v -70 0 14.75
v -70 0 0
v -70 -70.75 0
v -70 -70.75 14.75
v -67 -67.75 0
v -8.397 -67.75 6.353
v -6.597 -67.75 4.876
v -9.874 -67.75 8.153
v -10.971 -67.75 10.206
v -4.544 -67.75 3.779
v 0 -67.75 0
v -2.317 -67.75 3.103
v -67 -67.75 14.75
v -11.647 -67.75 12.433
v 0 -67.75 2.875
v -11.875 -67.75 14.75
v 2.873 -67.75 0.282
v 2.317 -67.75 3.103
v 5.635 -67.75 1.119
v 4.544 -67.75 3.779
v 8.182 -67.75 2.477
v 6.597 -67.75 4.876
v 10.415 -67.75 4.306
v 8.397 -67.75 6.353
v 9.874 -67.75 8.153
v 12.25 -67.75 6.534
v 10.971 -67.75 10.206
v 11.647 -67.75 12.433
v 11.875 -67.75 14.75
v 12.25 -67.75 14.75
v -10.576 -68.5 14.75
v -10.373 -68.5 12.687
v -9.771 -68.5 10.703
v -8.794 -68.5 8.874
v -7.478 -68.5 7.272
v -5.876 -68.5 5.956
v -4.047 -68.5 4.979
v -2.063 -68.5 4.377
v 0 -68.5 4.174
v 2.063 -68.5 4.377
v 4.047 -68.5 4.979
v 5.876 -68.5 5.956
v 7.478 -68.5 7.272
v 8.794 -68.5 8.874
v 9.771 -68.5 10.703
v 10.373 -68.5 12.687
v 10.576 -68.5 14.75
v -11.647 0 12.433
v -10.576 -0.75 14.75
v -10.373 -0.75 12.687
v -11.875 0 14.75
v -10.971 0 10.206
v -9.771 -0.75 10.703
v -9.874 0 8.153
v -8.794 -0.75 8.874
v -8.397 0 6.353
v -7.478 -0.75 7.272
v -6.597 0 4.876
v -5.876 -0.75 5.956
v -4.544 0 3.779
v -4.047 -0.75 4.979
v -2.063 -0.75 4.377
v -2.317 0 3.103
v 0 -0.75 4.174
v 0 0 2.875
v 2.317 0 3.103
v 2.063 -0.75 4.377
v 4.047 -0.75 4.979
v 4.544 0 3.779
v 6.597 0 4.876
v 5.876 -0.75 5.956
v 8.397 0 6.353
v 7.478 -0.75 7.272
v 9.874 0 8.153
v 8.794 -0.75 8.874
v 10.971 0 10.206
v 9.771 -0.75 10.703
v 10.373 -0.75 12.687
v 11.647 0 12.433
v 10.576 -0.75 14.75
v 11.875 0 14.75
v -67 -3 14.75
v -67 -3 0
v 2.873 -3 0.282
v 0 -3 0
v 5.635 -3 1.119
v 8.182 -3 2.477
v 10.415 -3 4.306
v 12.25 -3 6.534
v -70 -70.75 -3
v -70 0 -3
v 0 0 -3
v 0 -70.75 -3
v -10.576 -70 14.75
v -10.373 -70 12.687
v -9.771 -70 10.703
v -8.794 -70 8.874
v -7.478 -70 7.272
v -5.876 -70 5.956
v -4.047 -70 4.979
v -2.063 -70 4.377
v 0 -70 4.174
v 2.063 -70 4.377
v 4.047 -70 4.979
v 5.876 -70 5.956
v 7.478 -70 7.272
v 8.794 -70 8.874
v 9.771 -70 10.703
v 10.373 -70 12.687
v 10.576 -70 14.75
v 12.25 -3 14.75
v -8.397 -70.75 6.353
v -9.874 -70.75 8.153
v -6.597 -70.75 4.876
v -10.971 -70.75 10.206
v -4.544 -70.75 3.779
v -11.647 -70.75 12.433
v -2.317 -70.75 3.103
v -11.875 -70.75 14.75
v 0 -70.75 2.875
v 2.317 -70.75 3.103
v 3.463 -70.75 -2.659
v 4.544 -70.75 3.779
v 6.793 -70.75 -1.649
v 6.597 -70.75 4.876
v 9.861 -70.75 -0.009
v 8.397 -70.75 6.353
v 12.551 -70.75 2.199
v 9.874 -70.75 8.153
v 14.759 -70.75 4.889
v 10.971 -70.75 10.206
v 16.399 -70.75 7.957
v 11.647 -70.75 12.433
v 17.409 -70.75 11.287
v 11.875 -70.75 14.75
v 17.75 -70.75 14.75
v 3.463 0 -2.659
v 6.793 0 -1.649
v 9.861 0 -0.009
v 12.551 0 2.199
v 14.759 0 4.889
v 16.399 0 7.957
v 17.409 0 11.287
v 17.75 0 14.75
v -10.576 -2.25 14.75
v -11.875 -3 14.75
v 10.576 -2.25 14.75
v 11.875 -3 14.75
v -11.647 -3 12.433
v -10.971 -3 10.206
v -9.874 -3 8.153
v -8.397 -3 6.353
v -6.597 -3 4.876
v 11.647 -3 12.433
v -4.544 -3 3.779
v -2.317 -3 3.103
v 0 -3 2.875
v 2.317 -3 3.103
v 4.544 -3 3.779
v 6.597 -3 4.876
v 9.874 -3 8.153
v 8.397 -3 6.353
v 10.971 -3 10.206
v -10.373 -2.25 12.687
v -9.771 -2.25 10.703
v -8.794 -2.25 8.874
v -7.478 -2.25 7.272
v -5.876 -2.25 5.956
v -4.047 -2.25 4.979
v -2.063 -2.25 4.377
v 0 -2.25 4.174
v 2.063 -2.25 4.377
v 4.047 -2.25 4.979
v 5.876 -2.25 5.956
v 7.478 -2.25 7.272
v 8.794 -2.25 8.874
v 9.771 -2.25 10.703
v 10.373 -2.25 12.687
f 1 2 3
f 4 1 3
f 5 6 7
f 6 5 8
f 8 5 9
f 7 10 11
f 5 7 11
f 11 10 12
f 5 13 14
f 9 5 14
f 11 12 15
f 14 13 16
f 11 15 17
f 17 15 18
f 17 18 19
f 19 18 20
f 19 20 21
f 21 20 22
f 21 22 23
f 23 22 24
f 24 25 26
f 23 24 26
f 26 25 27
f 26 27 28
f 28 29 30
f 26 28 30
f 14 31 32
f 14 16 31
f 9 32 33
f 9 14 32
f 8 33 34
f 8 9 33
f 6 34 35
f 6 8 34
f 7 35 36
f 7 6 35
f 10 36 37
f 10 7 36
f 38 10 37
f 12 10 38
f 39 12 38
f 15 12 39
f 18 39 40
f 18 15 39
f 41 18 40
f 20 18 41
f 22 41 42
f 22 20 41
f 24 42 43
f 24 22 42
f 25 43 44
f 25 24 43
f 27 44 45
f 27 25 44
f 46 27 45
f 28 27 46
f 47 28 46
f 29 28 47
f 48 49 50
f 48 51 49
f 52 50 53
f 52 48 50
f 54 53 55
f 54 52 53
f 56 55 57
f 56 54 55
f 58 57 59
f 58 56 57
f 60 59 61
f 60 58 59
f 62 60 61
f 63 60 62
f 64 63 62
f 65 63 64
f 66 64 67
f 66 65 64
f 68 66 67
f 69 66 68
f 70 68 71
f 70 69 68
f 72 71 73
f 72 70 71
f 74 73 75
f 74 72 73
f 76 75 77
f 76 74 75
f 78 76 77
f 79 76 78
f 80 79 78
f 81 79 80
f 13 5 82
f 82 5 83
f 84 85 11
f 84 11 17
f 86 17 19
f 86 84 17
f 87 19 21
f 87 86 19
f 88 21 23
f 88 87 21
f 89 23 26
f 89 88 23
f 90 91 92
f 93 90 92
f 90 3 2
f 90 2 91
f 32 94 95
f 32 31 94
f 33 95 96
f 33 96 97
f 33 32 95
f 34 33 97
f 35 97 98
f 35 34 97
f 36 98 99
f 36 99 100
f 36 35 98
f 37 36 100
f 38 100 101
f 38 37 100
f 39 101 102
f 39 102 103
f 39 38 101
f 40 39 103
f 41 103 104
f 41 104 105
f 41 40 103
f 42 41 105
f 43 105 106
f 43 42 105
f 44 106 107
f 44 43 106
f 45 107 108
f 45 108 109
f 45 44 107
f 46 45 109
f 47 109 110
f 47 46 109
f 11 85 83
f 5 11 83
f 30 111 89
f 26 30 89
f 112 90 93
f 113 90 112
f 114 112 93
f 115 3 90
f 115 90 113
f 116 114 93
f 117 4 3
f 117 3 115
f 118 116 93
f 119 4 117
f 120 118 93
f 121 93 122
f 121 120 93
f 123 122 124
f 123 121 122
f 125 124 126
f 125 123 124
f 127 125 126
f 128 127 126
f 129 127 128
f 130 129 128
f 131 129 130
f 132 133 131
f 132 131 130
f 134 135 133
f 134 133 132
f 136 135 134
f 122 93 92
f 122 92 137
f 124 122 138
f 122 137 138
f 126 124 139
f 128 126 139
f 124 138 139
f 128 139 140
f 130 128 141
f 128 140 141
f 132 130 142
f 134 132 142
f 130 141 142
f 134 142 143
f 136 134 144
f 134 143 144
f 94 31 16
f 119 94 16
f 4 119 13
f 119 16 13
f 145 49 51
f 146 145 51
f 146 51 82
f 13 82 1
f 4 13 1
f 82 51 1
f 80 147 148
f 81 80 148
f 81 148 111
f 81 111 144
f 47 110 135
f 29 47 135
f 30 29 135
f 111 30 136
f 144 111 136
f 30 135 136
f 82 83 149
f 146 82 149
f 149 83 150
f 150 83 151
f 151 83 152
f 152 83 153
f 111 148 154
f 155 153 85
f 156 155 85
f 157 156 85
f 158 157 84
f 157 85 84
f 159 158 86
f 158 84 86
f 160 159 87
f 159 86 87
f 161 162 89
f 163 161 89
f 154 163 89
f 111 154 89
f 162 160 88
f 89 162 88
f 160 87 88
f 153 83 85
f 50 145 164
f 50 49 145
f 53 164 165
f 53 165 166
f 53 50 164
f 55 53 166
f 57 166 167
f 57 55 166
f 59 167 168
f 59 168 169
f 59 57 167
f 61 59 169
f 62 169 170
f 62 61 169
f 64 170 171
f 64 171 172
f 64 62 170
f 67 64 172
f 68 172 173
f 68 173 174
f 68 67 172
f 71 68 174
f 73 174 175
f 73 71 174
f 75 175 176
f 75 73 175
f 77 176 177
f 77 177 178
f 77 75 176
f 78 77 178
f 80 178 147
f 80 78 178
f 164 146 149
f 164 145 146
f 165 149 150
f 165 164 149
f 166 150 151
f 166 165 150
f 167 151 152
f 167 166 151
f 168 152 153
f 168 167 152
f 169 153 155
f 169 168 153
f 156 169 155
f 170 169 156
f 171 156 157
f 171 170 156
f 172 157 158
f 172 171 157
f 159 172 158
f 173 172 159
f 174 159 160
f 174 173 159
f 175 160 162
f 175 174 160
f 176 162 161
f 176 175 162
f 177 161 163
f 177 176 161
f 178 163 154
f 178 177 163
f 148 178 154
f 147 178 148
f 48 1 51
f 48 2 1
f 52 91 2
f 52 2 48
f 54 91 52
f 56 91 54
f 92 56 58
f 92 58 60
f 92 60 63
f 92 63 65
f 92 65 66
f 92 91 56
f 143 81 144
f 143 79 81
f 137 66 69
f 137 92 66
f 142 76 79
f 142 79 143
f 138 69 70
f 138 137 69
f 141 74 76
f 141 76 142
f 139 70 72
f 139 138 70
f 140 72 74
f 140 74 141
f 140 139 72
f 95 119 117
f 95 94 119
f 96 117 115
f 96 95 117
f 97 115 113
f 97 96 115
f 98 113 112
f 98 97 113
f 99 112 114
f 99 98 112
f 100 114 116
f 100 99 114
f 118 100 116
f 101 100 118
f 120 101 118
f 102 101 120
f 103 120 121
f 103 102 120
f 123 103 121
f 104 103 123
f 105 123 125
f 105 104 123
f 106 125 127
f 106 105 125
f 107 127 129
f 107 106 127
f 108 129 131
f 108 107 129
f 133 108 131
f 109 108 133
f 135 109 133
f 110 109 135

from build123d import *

# Parameters (mm, degrees)
PAD005_DEPTH        = 70.75
PAD006_DEPTH        = 14.75
PAD007_DEPTH        = 3
PAD008_DEPTH        = 3
POCKET001_DEPTH     = 70.751
REVOLUTION001_ANGLE = 180
SKETCH013_W         = 2.5
SKETCH013_H         = 8.75
PAD009_DEPTH        = 67.75


with BuildPart() as part:
    # Sketch007 → Pad005 (new body)
    with BuildSketch(Plane.XZ):
        with BuildLine():
            ThreePointArc((0, 0), (10.429825, 4.320175), (14.75, 14.75))
            Line((14.75, 14.75), (17.75, 14.75))
            ThreePointArc((4.3e-05, -3), (12.55116, 2.19887), (17.75, 14.75))
            Line((-69.999957, -3), (4.3e-05, -3))
            Line((-69.999957, 0), (-69.999957, -3))
            Line((0, 0), (-69.999957, 0))
        make_face()
    extrude(amount=PAD005_DEPTH)

    # Sketch008 (on Face6 of Pad005) → Pad006 (join)
    with BuildSketch(Plane(origin=(0, 0, 0), x_dir=(-1, 0, 0), z_dir=(0, 0, 1))):
        Polygon((70, 0), (70, 70.75), (0, 70.75), (0, 67.75), (67, 67.75), (67, 3), (0, 3), (0, 0), align=None)
    extrude(amount=PAD006_DEPTH)

    # Sketch009 (on Face15 of Pad006) → Pad007 (join)
    with BuildSketch(Plane.XZ.offset(70.75)):
        with BuildLine():
            ThreePointArc((0, 0), (10.429825, 4.320175), (14.75, 14.75))
            Line((0, 14.75), (14.75, 14.75))
            Line((0, 0), (0, 14.75))
        make_face()
    extrude(amount=-PAD007_DEPTH)

    # Sketch010 (on Face2 of Pad007) → Pad008 (join)
    with BuildSketch(Plane(origin=(0, 0, 0), x_dir=(1, 0, 0), z_dir=(0, 1, 0))):
        with BuildLine():
            ThreePointArc((14.75, -14.75), (10.429825, -4.320175), (0, 0))
            Line((0, -14.75), (0, 0))
            Line((14.75, -14.75), (0, -14.75))
        make_face()
    extrude(amount=-PAD008_DEPTH)

    # Sketch011 (on Face2 of Pad008) → Pocket001 (cut, through all)
    with BuildSketch(Plane.XZ.offset(70.75)):
        with BuildLine():
            ThreePointArc((-11.875, 14.75), (0, 2.875), (11.875, 14.75))
            Line((-11.875, 14.75), (11.875, 14.75))
        make_face()
    extrude(amount=-POCKET001_DEPTH, mode=Mode.SUBTRACT)

    # Sketch012 (on Face5 of Pocket001) → Revolution001 (revolve)
    with BuildSketch(Plane(origin=(0, 0, 14.75), x_dir=(-1, 0, 0), z_dir=(0, 0, 1))):
        Polygon((13.174038, 70), (11.875, 70.75), (10.575962, 70), (10.575962, 68.5), (11.875, 67.75), (13.174038, 68.5), align=None)
        Polygon((13.174038, 2.25), (11.875, 3), (10.575962, 2.25), (10.575962, 0.75), (11.875, 0), (13.174038, 0.75), align=None)
    revolve(axis=Axis((0, 0, 14.75), (0, -1, 0)), revolution_arc=REVOLUTION001_ANGLE)

    # Sketch013 (on Face3 of Revolution001) → Pad009 (join)
    with BuildSketch(Plane(origin=(0, -67.75, 0), x_dir=(1, 0, 0), z_dir=(0, 1, 0))):
        with Locations((13.5, -10.375)):
            Rectangle(SKETCH013_W, SKETCH013_H)
    extrude(amount=PAD009_DEPTH)


solid = part.part
